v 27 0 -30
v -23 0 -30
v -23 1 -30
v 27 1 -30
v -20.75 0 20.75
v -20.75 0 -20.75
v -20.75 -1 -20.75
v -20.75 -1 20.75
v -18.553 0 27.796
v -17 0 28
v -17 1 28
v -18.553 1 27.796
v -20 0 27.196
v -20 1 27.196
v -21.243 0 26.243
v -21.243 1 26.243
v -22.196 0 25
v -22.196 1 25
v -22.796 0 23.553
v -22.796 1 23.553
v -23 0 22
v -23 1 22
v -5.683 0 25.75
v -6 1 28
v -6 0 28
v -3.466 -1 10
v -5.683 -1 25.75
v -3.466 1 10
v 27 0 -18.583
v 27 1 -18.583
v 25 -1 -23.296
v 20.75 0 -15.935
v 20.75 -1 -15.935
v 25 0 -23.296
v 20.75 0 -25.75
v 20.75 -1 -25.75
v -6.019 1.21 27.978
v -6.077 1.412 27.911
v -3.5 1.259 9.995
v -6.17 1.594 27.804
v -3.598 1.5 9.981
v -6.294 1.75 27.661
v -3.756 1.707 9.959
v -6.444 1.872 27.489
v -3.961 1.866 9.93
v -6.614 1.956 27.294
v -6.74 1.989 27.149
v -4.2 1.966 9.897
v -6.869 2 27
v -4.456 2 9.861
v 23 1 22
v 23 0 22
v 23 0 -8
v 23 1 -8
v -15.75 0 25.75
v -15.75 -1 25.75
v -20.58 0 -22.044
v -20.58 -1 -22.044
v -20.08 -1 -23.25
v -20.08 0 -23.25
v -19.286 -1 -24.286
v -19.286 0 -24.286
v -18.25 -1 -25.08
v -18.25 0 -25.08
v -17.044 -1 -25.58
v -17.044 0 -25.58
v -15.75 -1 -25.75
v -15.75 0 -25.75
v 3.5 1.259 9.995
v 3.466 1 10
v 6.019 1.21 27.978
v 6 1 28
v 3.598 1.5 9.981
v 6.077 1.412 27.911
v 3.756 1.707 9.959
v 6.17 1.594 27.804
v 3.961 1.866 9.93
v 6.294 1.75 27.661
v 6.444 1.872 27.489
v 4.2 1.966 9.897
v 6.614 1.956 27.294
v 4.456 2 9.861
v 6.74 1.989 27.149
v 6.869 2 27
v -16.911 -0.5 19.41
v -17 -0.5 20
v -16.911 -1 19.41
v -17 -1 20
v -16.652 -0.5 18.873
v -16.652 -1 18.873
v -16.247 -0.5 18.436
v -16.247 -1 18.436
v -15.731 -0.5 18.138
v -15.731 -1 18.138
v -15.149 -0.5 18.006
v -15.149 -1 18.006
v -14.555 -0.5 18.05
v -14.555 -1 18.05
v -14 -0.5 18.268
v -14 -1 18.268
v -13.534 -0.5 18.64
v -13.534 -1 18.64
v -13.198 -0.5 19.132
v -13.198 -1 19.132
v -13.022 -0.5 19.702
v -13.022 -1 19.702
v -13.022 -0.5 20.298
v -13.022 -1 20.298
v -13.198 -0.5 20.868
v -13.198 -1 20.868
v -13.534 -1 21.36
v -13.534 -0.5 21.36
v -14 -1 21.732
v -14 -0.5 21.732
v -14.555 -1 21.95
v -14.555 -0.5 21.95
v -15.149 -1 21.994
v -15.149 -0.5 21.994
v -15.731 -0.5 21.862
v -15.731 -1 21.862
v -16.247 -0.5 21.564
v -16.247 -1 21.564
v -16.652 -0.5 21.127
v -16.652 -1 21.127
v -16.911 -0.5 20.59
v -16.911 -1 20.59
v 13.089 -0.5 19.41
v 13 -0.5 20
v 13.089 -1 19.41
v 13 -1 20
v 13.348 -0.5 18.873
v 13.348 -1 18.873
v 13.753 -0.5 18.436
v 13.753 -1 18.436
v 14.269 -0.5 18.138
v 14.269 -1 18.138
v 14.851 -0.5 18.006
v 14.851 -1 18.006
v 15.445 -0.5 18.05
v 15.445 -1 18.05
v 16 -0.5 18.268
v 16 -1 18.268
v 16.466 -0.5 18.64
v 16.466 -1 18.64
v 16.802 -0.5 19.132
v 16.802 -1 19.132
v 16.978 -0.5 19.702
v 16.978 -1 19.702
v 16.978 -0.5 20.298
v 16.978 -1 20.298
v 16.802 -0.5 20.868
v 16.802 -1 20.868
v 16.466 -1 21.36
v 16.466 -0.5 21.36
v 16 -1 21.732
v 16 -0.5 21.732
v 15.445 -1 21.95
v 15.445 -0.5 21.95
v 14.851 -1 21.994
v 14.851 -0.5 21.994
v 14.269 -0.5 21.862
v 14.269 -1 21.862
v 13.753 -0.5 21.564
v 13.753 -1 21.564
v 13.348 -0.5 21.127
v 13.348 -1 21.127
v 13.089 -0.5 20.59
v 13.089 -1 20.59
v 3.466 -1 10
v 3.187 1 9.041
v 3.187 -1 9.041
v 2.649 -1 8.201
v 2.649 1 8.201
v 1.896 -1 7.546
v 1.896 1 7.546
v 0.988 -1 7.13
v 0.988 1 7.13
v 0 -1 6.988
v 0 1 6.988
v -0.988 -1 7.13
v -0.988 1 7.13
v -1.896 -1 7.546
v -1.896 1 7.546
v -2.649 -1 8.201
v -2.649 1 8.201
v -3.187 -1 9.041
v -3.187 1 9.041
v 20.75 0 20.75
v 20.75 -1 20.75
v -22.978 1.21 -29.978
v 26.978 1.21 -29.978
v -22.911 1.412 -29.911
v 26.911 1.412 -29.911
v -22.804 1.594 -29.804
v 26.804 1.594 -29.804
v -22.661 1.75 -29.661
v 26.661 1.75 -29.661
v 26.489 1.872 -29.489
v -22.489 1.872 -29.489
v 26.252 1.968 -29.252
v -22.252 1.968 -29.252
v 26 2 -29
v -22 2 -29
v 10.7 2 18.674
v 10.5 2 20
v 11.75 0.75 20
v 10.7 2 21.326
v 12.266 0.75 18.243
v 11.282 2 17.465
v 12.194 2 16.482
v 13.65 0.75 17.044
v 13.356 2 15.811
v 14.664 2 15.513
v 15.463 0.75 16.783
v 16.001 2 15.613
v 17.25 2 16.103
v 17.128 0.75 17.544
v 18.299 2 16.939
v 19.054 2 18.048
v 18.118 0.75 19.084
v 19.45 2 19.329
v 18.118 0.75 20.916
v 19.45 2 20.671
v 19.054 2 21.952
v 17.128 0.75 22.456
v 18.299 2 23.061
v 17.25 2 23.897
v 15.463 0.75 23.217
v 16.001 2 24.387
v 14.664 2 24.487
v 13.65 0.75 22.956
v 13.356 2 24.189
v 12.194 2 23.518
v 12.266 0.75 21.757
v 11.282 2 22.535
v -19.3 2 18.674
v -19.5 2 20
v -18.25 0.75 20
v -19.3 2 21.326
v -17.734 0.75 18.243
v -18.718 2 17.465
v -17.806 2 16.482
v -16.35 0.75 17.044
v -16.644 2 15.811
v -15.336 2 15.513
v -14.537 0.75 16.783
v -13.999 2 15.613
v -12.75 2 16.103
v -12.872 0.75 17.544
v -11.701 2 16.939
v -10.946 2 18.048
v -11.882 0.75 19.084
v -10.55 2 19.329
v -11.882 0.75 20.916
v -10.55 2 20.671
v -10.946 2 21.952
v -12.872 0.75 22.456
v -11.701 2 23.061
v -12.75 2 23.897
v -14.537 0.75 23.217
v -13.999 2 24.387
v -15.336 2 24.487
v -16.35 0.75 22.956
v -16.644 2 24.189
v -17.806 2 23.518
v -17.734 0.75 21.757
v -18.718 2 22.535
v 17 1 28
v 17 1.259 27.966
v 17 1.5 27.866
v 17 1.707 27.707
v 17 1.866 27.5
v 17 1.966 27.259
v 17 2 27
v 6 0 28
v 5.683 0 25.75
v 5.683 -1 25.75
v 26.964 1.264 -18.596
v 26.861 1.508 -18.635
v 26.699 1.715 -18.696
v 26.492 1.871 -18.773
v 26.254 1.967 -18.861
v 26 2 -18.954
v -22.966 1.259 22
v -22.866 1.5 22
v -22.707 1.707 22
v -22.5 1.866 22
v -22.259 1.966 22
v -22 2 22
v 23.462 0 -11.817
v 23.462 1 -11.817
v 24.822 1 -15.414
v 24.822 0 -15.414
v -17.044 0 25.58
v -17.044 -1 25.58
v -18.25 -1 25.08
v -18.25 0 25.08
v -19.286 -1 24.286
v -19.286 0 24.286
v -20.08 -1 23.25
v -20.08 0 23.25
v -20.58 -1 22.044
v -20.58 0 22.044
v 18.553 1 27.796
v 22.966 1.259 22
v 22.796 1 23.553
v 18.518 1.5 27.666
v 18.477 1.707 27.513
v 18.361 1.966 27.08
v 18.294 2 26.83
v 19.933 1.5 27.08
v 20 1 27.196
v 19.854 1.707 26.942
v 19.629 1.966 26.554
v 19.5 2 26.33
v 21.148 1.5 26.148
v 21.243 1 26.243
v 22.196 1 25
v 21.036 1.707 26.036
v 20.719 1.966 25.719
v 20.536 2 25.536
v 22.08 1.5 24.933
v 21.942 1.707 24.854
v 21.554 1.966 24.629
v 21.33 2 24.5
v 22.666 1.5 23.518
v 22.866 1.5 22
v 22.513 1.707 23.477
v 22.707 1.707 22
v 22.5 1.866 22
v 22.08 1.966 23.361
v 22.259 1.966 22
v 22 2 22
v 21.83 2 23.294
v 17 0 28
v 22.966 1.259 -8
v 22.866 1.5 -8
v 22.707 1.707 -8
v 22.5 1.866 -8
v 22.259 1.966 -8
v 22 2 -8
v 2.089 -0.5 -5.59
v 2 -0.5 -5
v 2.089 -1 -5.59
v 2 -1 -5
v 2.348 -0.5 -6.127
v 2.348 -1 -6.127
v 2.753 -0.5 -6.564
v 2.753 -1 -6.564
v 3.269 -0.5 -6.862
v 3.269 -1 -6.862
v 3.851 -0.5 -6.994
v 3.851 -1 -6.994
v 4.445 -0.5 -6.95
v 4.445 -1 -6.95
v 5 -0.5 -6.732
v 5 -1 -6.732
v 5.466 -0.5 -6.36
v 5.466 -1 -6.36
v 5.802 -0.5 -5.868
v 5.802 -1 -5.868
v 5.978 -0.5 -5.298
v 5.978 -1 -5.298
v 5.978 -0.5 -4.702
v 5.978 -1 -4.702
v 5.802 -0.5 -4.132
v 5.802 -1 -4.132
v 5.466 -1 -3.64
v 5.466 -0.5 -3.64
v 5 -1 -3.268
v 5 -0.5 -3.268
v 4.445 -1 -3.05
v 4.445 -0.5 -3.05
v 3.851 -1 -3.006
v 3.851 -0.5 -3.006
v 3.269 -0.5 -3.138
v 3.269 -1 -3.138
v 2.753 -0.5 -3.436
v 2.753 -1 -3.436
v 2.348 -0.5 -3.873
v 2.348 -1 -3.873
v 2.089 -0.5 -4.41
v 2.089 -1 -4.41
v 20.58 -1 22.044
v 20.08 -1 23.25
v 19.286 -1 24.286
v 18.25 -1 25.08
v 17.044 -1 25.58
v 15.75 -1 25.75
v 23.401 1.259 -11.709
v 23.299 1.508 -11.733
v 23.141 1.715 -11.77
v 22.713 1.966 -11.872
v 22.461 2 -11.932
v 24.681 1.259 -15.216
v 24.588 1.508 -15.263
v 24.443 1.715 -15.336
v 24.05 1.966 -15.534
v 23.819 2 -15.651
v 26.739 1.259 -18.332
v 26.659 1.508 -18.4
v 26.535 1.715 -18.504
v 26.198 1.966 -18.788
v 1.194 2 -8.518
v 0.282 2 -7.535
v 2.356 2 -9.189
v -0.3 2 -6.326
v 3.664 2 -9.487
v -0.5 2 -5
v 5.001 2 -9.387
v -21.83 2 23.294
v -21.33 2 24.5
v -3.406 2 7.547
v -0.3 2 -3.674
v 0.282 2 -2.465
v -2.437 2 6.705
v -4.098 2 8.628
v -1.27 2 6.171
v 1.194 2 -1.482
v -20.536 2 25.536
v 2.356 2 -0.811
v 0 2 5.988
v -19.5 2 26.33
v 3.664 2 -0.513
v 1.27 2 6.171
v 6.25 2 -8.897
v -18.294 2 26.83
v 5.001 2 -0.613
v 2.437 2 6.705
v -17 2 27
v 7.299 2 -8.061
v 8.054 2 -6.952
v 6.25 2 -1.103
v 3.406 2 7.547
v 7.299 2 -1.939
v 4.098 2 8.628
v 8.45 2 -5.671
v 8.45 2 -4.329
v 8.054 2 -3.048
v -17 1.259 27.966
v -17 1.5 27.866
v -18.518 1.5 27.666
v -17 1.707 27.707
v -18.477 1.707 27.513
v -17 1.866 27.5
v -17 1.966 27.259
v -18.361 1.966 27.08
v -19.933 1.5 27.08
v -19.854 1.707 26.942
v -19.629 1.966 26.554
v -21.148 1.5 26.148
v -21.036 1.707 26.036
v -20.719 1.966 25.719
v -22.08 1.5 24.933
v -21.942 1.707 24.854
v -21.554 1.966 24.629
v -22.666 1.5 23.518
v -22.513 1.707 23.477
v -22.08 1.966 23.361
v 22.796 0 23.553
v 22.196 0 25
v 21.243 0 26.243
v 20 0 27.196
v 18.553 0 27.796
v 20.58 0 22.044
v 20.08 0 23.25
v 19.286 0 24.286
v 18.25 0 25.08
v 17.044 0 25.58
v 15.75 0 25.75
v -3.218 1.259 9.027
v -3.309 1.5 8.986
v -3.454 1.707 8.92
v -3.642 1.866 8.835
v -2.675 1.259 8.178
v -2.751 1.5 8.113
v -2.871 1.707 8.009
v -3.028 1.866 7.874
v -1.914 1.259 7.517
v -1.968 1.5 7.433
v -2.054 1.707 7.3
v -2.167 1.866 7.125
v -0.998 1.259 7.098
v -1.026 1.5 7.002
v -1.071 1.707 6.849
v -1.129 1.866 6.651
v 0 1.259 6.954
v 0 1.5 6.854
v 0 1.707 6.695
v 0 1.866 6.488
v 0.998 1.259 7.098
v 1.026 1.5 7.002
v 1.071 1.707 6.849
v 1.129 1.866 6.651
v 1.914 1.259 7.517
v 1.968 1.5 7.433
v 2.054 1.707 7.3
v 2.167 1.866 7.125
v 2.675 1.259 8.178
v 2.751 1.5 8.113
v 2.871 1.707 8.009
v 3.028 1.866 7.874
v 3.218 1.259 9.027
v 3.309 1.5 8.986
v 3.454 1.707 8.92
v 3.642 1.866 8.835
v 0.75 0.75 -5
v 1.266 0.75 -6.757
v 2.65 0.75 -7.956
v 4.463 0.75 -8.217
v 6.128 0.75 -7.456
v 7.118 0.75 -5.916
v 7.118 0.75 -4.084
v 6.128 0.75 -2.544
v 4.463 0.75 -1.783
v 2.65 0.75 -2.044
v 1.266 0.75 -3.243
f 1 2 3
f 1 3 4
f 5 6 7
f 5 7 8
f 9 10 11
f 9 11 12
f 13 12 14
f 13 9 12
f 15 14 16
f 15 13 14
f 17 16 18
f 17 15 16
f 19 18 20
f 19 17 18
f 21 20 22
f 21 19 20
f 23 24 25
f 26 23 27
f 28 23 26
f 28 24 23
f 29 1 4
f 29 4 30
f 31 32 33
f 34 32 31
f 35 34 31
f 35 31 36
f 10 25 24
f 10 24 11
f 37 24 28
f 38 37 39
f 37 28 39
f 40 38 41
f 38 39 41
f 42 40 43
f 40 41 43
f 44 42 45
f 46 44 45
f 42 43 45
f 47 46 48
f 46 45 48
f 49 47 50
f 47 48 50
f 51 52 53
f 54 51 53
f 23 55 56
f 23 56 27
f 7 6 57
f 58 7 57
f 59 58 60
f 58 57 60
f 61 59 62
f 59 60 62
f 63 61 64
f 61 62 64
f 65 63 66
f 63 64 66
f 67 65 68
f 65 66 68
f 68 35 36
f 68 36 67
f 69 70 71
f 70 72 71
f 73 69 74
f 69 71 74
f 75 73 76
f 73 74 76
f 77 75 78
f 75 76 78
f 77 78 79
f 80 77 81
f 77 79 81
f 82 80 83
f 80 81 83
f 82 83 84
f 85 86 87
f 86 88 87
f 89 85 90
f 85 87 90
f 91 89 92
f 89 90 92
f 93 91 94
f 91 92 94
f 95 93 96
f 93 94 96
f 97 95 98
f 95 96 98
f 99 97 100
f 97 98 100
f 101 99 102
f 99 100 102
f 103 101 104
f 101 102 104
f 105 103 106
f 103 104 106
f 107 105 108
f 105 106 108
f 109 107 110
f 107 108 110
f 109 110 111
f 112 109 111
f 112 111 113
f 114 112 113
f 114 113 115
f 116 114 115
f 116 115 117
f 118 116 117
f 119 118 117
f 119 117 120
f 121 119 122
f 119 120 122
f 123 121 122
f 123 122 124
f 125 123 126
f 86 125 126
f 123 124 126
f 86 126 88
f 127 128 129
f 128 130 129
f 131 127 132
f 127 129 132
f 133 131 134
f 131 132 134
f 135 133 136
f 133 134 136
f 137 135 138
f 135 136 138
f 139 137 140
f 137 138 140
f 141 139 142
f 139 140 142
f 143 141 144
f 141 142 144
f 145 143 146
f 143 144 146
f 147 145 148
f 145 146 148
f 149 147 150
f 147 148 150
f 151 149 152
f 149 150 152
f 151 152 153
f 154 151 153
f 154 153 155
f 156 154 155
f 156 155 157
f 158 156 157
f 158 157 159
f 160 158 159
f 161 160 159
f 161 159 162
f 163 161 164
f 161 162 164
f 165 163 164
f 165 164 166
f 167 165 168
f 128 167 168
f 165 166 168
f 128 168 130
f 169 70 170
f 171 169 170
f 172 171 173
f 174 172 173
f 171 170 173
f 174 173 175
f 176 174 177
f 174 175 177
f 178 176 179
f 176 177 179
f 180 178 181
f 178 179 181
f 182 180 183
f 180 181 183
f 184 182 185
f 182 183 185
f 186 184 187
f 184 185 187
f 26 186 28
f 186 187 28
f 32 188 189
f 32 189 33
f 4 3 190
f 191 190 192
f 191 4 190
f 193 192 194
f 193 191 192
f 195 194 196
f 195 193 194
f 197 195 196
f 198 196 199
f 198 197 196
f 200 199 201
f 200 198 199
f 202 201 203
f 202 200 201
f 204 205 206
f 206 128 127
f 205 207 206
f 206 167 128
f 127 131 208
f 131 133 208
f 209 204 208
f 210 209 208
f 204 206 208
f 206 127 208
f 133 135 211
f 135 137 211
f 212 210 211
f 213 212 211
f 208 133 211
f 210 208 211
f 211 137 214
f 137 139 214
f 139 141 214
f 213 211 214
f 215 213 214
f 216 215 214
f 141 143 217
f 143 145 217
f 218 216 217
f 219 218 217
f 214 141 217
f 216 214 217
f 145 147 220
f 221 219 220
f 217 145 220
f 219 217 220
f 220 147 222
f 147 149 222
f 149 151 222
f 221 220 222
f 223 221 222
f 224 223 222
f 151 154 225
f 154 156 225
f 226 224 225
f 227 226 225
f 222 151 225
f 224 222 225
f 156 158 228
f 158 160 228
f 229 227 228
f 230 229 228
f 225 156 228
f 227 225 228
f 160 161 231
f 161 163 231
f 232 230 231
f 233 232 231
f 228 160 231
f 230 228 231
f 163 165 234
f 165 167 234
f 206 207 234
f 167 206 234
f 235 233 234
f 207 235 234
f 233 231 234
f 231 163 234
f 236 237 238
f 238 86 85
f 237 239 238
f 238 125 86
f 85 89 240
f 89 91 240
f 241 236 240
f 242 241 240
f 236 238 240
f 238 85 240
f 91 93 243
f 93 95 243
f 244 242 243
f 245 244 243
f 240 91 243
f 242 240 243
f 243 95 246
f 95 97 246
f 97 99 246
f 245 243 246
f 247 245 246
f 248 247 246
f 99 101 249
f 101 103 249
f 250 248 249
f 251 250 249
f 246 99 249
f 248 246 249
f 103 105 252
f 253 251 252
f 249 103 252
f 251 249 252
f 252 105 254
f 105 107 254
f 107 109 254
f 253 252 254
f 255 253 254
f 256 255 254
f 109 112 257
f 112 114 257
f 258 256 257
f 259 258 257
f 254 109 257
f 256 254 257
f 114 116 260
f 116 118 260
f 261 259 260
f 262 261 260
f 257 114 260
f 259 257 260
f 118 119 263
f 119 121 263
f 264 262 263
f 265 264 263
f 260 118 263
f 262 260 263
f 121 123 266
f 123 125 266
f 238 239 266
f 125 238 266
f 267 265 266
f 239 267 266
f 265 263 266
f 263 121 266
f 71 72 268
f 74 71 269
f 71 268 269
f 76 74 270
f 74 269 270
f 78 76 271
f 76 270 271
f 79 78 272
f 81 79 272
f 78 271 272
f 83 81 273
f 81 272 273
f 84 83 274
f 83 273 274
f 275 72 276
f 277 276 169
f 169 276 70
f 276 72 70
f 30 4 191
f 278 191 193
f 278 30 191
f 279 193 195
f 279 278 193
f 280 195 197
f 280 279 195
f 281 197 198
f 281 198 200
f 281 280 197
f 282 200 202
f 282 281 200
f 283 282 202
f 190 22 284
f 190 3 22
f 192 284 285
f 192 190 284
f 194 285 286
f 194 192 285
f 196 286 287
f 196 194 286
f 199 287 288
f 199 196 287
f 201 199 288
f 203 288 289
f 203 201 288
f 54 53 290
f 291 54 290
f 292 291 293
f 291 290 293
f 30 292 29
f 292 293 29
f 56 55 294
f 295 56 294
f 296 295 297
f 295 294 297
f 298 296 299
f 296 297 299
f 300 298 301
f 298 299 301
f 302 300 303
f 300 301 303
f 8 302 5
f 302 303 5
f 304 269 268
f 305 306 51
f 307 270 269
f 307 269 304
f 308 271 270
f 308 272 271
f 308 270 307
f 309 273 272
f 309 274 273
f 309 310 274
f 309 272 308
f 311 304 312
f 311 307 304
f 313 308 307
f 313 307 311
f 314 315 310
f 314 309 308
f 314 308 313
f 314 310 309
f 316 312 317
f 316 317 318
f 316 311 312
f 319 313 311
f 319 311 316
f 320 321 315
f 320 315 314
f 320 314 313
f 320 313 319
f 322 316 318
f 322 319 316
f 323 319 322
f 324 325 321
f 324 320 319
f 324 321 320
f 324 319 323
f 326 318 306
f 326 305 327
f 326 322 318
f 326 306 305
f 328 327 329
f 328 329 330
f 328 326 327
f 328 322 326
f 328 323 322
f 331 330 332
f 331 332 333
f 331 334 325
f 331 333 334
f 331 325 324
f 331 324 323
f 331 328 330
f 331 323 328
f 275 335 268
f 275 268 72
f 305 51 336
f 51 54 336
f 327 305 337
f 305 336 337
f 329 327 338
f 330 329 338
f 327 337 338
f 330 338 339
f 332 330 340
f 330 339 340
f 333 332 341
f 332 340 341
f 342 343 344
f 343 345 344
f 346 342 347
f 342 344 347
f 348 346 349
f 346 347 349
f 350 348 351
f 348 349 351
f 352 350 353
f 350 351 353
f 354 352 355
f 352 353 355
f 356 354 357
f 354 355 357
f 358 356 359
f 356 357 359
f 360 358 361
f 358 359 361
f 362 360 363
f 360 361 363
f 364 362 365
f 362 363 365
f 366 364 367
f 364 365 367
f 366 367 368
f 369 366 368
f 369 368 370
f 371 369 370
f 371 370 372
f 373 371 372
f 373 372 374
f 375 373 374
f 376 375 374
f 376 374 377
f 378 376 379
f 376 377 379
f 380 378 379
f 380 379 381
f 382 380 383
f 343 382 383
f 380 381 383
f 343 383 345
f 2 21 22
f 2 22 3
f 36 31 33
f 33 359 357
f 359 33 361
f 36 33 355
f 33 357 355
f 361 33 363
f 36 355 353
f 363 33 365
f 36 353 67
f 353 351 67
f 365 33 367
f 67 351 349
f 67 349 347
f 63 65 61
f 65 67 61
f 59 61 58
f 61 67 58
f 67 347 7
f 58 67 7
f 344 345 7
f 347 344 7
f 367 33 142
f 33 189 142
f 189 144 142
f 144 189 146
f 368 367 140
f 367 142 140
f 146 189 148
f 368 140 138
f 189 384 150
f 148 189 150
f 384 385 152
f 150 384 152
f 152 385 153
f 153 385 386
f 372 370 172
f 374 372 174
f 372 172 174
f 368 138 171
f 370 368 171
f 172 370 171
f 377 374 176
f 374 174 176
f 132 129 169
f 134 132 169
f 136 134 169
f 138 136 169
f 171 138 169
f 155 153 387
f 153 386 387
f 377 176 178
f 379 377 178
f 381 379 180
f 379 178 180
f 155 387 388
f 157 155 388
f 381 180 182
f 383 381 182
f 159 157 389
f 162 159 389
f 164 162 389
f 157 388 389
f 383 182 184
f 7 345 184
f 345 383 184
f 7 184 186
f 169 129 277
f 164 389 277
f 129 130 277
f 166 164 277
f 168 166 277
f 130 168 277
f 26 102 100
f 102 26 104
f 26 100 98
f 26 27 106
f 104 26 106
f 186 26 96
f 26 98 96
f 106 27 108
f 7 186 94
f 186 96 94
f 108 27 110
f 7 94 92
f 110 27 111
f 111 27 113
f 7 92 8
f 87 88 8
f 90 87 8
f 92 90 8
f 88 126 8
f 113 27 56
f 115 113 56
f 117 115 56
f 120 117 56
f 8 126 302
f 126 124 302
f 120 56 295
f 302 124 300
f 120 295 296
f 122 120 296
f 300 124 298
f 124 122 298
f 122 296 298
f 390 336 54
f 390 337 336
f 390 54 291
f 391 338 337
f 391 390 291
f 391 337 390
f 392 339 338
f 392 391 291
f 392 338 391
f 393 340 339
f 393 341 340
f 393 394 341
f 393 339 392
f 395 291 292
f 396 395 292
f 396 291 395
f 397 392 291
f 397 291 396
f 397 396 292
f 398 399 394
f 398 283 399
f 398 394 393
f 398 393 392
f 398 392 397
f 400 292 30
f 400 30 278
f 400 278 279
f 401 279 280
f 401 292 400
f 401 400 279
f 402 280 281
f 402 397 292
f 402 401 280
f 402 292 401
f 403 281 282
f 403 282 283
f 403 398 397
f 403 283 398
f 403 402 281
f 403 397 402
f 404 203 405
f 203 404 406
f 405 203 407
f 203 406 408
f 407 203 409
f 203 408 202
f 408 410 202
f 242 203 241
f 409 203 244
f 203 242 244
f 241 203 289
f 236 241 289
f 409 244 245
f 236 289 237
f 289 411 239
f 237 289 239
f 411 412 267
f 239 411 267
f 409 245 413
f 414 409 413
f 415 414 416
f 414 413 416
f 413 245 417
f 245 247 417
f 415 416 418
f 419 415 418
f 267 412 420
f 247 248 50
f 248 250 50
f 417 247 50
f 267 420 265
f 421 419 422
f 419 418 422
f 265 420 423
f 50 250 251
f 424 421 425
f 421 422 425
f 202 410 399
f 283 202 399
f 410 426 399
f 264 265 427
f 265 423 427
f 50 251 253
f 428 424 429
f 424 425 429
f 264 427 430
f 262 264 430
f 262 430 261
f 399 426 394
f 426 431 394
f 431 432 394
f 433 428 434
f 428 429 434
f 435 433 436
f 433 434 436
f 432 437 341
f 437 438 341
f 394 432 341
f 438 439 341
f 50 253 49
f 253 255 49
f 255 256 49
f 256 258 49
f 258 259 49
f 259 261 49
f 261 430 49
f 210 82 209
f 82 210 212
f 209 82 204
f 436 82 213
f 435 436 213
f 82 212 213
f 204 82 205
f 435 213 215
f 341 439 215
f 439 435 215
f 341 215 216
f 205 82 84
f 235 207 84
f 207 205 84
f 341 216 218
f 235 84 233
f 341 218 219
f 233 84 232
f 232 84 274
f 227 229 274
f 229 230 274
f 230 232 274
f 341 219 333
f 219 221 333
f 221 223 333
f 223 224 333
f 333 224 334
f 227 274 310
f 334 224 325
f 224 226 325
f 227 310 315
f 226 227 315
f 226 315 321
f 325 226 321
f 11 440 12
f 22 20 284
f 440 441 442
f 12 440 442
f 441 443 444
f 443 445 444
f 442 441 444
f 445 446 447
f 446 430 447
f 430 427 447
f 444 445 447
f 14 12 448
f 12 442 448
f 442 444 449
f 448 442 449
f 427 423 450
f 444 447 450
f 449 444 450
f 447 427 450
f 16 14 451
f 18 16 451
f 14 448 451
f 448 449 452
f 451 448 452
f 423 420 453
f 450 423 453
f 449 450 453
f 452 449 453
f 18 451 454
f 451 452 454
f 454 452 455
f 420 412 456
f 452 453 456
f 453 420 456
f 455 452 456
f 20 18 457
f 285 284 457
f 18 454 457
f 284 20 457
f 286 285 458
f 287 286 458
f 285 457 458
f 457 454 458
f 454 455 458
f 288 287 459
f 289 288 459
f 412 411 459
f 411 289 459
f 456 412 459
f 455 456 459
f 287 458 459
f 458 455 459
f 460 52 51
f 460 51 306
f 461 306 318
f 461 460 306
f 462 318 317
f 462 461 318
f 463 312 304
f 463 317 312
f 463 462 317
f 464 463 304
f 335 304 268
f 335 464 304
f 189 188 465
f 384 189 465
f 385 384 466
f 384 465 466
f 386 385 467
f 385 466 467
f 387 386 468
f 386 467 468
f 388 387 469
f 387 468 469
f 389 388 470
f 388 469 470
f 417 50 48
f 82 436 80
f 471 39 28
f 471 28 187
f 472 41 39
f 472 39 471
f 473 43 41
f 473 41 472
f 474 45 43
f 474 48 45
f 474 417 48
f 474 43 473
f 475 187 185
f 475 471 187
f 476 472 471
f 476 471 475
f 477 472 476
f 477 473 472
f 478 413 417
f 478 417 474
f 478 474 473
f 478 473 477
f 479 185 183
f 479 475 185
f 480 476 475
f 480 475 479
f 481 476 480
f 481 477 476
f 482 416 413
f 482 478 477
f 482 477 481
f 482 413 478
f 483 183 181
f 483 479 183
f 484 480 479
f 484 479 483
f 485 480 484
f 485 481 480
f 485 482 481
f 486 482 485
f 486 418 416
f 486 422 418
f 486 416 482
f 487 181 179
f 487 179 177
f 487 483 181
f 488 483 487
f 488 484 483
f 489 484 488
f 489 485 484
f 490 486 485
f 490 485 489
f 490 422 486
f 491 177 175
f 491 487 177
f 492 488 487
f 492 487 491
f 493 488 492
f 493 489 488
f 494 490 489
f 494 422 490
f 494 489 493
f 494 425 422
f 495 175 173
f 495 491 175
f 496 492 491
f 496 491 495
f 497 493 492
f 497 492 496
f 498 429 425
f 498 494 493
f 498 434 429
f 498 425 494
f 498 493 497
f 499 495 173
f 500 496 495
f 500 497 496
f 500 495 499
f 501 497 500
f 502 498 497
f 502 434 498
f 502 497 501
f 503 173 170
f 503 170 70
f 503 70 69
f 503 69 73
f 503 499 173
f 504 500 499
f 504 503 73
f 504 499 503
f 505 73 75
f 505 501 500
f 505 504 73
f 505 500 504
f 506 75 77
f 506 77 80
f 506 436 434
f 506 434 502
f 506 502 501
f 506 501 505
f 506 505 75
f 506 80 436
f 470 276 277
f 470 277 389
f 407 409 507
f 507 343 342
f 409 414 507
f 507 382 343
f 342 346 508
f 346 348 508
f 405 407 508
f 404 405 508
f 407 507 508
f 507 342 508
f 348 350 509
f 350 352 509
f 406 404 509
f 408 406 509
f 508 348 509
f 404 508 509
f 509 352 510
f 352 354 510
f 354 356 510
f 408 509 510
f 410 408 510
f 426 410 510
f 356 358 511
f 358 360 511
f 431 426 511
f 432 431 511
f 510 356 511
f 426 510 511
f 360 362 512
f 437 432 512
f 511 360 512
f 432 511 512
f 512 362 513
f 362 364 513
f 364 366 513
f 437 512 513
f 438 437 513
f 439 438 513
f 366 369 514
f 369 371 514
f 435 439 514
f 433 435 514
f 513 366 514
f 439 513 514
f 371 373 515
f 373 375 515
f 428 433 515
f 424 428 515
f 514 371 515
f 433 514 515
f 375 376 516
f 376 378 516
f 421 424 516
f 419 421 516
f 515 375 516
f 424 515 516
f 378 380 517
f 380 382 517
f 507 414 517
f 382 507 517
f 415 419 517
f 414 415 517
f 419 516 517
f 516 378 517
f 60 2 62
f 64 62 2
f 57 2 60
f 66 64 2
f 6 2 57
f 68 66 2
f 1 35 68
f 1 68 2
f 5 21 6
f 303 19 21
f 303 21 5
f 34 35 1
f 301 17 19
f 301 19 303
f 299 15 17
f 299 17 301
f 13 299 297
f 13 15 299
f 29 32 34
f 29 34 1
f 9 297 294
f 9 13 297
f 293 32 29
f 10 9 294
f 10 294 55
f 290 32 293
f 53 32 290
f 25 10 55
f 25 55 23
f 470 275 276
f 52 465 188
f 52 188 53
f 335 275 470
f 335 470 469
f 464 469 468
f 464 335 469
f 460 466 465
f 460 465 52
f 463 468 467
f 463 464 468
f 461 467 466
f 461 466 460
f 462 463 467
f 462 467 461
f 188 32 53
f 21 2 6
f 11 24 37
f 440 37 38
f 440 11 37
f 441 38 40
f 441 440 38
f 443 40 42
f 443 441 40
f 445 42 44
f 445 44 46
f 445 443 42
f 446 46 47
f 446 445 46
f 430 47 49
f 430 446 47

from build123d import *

# Parameters (mm, degrees)
PAD008_DEPTH        = 2
PAD009_DEPTH        = 1
POCKET009_DEPTH     = 3.001
HOLE006_D           = 4
HOLE006_DEPTH       = 25
HOLE006_CSINK_D     = 9
HOLE006_CSINK_ANGLE = 90
FILLET007_R         = 1


with BuildPart() as part:
    # Sketch025 → Pad008 (new body)
    with BuildSketch(Plane.XZ):
        with BuildLine():
            Line((17, 28), (-17, 28))
            ThreePointArc((-17, 28), (-21.242641, 26.242641), (-23, 22))
            Line((-23, 22), (-23, -30))
            Line((-23, -30), (27, -30))
            Line((27, -30), (27, -18.583005))
            ThreePointArc((23, -8), (24.03337, -13.656854), (27, -18.583005))
            Line((23, 22), (23, -8))
            ThreePointArc((23, 22), (21.242641, 26.242641), (17, 28))
        make_face()
    extrude(amount=-PAD008_DEPTH)

    # Sketch026 (on Face9 of Pad008) → Pad009 (join)
    with BuildSketch(Plane.XZ):
        with BuildLine():
            Line((-20.75, -20.75), (-20.75, 20.75))
            ThreePointArc((-15.75, 25.75), (-19.285534, 24.285534), (-20.75, 20.75))
            Line((-15.75, 25.75), (15.75, 25.75))
            ThreePointArc((20.75, 20.75), (19.285534, 24.285534), (15.75, 25.75))
            Line((20.75, 20.75), (20.75, -15.935045))
            Line((20.75, -15.935045), (25, -23.296261))
            Line((25, -23.296261), (20.75, -25.75))
            Line((20.75, -25.75), (-15.75, -25.75))
            ThreePointArc((-20.75, -20.75), (-19.285534, -24.285534), (-15.75, -25.75))
        make_face()
    extrude(amount=PAD009_DEPTH)

    # Sketch027 (on Face5 of Pad009) → Pocket009 (cut, through all)
    with BuildSketch(Plane(origin=(0, 2, 0), x_dir=(1, 0, 0), z_dir=(0, 1, 0))):
        with BuildLine():
            Line((-6, -28), (6, -28))
            Line((6, -28), (3.46582, -10))
            ThreePointArc((3.46582, -10), (0, -6.987945), (-3.46582, -10))
            Line((-6, -28), (-3.46582, -10))
        make_face()
    extrude(amount=-POCKET009_DEPTH, mode=Mode.SUBTRACT)

    # Hole006
    with Locations(Plane(origin=(0, 2, 0), x_dir=(1, 0, 0), z_dir=(0, 1, 0))):
        with Locations((-15, -20), (15, -20), (4, 5)):
            CounterSinkHole(HOLE006_D / 2, HOLE006_CSINK_D / 2, depth=HOLE006_DEPTH, counter_sink_angle=HOLE006_CSINK_ANGLE)

    # Fillet007
    fillet007_edges = [part.edges().sort_by_distance(p)[0] for p in [
        (23, 2, 7),
        (24.03337, 2, -13.656854),
        (27, 2, -24.291503),
        (2, 2, -30),
        (-23, 2, -4),
        (-21.242641, 2, 26.242641),
        (-11.5, 2, 28),
        (-4.73291, 2, 19),
        (0, 2, 6.987945),
        (4.73291, 2, 19),
        (11.5, 2, 28),
        (21.242641, 2, 26.242641),
    ]]
    fillet(fillet007_edges, radius=FILLET007_R)


solid = part.part
